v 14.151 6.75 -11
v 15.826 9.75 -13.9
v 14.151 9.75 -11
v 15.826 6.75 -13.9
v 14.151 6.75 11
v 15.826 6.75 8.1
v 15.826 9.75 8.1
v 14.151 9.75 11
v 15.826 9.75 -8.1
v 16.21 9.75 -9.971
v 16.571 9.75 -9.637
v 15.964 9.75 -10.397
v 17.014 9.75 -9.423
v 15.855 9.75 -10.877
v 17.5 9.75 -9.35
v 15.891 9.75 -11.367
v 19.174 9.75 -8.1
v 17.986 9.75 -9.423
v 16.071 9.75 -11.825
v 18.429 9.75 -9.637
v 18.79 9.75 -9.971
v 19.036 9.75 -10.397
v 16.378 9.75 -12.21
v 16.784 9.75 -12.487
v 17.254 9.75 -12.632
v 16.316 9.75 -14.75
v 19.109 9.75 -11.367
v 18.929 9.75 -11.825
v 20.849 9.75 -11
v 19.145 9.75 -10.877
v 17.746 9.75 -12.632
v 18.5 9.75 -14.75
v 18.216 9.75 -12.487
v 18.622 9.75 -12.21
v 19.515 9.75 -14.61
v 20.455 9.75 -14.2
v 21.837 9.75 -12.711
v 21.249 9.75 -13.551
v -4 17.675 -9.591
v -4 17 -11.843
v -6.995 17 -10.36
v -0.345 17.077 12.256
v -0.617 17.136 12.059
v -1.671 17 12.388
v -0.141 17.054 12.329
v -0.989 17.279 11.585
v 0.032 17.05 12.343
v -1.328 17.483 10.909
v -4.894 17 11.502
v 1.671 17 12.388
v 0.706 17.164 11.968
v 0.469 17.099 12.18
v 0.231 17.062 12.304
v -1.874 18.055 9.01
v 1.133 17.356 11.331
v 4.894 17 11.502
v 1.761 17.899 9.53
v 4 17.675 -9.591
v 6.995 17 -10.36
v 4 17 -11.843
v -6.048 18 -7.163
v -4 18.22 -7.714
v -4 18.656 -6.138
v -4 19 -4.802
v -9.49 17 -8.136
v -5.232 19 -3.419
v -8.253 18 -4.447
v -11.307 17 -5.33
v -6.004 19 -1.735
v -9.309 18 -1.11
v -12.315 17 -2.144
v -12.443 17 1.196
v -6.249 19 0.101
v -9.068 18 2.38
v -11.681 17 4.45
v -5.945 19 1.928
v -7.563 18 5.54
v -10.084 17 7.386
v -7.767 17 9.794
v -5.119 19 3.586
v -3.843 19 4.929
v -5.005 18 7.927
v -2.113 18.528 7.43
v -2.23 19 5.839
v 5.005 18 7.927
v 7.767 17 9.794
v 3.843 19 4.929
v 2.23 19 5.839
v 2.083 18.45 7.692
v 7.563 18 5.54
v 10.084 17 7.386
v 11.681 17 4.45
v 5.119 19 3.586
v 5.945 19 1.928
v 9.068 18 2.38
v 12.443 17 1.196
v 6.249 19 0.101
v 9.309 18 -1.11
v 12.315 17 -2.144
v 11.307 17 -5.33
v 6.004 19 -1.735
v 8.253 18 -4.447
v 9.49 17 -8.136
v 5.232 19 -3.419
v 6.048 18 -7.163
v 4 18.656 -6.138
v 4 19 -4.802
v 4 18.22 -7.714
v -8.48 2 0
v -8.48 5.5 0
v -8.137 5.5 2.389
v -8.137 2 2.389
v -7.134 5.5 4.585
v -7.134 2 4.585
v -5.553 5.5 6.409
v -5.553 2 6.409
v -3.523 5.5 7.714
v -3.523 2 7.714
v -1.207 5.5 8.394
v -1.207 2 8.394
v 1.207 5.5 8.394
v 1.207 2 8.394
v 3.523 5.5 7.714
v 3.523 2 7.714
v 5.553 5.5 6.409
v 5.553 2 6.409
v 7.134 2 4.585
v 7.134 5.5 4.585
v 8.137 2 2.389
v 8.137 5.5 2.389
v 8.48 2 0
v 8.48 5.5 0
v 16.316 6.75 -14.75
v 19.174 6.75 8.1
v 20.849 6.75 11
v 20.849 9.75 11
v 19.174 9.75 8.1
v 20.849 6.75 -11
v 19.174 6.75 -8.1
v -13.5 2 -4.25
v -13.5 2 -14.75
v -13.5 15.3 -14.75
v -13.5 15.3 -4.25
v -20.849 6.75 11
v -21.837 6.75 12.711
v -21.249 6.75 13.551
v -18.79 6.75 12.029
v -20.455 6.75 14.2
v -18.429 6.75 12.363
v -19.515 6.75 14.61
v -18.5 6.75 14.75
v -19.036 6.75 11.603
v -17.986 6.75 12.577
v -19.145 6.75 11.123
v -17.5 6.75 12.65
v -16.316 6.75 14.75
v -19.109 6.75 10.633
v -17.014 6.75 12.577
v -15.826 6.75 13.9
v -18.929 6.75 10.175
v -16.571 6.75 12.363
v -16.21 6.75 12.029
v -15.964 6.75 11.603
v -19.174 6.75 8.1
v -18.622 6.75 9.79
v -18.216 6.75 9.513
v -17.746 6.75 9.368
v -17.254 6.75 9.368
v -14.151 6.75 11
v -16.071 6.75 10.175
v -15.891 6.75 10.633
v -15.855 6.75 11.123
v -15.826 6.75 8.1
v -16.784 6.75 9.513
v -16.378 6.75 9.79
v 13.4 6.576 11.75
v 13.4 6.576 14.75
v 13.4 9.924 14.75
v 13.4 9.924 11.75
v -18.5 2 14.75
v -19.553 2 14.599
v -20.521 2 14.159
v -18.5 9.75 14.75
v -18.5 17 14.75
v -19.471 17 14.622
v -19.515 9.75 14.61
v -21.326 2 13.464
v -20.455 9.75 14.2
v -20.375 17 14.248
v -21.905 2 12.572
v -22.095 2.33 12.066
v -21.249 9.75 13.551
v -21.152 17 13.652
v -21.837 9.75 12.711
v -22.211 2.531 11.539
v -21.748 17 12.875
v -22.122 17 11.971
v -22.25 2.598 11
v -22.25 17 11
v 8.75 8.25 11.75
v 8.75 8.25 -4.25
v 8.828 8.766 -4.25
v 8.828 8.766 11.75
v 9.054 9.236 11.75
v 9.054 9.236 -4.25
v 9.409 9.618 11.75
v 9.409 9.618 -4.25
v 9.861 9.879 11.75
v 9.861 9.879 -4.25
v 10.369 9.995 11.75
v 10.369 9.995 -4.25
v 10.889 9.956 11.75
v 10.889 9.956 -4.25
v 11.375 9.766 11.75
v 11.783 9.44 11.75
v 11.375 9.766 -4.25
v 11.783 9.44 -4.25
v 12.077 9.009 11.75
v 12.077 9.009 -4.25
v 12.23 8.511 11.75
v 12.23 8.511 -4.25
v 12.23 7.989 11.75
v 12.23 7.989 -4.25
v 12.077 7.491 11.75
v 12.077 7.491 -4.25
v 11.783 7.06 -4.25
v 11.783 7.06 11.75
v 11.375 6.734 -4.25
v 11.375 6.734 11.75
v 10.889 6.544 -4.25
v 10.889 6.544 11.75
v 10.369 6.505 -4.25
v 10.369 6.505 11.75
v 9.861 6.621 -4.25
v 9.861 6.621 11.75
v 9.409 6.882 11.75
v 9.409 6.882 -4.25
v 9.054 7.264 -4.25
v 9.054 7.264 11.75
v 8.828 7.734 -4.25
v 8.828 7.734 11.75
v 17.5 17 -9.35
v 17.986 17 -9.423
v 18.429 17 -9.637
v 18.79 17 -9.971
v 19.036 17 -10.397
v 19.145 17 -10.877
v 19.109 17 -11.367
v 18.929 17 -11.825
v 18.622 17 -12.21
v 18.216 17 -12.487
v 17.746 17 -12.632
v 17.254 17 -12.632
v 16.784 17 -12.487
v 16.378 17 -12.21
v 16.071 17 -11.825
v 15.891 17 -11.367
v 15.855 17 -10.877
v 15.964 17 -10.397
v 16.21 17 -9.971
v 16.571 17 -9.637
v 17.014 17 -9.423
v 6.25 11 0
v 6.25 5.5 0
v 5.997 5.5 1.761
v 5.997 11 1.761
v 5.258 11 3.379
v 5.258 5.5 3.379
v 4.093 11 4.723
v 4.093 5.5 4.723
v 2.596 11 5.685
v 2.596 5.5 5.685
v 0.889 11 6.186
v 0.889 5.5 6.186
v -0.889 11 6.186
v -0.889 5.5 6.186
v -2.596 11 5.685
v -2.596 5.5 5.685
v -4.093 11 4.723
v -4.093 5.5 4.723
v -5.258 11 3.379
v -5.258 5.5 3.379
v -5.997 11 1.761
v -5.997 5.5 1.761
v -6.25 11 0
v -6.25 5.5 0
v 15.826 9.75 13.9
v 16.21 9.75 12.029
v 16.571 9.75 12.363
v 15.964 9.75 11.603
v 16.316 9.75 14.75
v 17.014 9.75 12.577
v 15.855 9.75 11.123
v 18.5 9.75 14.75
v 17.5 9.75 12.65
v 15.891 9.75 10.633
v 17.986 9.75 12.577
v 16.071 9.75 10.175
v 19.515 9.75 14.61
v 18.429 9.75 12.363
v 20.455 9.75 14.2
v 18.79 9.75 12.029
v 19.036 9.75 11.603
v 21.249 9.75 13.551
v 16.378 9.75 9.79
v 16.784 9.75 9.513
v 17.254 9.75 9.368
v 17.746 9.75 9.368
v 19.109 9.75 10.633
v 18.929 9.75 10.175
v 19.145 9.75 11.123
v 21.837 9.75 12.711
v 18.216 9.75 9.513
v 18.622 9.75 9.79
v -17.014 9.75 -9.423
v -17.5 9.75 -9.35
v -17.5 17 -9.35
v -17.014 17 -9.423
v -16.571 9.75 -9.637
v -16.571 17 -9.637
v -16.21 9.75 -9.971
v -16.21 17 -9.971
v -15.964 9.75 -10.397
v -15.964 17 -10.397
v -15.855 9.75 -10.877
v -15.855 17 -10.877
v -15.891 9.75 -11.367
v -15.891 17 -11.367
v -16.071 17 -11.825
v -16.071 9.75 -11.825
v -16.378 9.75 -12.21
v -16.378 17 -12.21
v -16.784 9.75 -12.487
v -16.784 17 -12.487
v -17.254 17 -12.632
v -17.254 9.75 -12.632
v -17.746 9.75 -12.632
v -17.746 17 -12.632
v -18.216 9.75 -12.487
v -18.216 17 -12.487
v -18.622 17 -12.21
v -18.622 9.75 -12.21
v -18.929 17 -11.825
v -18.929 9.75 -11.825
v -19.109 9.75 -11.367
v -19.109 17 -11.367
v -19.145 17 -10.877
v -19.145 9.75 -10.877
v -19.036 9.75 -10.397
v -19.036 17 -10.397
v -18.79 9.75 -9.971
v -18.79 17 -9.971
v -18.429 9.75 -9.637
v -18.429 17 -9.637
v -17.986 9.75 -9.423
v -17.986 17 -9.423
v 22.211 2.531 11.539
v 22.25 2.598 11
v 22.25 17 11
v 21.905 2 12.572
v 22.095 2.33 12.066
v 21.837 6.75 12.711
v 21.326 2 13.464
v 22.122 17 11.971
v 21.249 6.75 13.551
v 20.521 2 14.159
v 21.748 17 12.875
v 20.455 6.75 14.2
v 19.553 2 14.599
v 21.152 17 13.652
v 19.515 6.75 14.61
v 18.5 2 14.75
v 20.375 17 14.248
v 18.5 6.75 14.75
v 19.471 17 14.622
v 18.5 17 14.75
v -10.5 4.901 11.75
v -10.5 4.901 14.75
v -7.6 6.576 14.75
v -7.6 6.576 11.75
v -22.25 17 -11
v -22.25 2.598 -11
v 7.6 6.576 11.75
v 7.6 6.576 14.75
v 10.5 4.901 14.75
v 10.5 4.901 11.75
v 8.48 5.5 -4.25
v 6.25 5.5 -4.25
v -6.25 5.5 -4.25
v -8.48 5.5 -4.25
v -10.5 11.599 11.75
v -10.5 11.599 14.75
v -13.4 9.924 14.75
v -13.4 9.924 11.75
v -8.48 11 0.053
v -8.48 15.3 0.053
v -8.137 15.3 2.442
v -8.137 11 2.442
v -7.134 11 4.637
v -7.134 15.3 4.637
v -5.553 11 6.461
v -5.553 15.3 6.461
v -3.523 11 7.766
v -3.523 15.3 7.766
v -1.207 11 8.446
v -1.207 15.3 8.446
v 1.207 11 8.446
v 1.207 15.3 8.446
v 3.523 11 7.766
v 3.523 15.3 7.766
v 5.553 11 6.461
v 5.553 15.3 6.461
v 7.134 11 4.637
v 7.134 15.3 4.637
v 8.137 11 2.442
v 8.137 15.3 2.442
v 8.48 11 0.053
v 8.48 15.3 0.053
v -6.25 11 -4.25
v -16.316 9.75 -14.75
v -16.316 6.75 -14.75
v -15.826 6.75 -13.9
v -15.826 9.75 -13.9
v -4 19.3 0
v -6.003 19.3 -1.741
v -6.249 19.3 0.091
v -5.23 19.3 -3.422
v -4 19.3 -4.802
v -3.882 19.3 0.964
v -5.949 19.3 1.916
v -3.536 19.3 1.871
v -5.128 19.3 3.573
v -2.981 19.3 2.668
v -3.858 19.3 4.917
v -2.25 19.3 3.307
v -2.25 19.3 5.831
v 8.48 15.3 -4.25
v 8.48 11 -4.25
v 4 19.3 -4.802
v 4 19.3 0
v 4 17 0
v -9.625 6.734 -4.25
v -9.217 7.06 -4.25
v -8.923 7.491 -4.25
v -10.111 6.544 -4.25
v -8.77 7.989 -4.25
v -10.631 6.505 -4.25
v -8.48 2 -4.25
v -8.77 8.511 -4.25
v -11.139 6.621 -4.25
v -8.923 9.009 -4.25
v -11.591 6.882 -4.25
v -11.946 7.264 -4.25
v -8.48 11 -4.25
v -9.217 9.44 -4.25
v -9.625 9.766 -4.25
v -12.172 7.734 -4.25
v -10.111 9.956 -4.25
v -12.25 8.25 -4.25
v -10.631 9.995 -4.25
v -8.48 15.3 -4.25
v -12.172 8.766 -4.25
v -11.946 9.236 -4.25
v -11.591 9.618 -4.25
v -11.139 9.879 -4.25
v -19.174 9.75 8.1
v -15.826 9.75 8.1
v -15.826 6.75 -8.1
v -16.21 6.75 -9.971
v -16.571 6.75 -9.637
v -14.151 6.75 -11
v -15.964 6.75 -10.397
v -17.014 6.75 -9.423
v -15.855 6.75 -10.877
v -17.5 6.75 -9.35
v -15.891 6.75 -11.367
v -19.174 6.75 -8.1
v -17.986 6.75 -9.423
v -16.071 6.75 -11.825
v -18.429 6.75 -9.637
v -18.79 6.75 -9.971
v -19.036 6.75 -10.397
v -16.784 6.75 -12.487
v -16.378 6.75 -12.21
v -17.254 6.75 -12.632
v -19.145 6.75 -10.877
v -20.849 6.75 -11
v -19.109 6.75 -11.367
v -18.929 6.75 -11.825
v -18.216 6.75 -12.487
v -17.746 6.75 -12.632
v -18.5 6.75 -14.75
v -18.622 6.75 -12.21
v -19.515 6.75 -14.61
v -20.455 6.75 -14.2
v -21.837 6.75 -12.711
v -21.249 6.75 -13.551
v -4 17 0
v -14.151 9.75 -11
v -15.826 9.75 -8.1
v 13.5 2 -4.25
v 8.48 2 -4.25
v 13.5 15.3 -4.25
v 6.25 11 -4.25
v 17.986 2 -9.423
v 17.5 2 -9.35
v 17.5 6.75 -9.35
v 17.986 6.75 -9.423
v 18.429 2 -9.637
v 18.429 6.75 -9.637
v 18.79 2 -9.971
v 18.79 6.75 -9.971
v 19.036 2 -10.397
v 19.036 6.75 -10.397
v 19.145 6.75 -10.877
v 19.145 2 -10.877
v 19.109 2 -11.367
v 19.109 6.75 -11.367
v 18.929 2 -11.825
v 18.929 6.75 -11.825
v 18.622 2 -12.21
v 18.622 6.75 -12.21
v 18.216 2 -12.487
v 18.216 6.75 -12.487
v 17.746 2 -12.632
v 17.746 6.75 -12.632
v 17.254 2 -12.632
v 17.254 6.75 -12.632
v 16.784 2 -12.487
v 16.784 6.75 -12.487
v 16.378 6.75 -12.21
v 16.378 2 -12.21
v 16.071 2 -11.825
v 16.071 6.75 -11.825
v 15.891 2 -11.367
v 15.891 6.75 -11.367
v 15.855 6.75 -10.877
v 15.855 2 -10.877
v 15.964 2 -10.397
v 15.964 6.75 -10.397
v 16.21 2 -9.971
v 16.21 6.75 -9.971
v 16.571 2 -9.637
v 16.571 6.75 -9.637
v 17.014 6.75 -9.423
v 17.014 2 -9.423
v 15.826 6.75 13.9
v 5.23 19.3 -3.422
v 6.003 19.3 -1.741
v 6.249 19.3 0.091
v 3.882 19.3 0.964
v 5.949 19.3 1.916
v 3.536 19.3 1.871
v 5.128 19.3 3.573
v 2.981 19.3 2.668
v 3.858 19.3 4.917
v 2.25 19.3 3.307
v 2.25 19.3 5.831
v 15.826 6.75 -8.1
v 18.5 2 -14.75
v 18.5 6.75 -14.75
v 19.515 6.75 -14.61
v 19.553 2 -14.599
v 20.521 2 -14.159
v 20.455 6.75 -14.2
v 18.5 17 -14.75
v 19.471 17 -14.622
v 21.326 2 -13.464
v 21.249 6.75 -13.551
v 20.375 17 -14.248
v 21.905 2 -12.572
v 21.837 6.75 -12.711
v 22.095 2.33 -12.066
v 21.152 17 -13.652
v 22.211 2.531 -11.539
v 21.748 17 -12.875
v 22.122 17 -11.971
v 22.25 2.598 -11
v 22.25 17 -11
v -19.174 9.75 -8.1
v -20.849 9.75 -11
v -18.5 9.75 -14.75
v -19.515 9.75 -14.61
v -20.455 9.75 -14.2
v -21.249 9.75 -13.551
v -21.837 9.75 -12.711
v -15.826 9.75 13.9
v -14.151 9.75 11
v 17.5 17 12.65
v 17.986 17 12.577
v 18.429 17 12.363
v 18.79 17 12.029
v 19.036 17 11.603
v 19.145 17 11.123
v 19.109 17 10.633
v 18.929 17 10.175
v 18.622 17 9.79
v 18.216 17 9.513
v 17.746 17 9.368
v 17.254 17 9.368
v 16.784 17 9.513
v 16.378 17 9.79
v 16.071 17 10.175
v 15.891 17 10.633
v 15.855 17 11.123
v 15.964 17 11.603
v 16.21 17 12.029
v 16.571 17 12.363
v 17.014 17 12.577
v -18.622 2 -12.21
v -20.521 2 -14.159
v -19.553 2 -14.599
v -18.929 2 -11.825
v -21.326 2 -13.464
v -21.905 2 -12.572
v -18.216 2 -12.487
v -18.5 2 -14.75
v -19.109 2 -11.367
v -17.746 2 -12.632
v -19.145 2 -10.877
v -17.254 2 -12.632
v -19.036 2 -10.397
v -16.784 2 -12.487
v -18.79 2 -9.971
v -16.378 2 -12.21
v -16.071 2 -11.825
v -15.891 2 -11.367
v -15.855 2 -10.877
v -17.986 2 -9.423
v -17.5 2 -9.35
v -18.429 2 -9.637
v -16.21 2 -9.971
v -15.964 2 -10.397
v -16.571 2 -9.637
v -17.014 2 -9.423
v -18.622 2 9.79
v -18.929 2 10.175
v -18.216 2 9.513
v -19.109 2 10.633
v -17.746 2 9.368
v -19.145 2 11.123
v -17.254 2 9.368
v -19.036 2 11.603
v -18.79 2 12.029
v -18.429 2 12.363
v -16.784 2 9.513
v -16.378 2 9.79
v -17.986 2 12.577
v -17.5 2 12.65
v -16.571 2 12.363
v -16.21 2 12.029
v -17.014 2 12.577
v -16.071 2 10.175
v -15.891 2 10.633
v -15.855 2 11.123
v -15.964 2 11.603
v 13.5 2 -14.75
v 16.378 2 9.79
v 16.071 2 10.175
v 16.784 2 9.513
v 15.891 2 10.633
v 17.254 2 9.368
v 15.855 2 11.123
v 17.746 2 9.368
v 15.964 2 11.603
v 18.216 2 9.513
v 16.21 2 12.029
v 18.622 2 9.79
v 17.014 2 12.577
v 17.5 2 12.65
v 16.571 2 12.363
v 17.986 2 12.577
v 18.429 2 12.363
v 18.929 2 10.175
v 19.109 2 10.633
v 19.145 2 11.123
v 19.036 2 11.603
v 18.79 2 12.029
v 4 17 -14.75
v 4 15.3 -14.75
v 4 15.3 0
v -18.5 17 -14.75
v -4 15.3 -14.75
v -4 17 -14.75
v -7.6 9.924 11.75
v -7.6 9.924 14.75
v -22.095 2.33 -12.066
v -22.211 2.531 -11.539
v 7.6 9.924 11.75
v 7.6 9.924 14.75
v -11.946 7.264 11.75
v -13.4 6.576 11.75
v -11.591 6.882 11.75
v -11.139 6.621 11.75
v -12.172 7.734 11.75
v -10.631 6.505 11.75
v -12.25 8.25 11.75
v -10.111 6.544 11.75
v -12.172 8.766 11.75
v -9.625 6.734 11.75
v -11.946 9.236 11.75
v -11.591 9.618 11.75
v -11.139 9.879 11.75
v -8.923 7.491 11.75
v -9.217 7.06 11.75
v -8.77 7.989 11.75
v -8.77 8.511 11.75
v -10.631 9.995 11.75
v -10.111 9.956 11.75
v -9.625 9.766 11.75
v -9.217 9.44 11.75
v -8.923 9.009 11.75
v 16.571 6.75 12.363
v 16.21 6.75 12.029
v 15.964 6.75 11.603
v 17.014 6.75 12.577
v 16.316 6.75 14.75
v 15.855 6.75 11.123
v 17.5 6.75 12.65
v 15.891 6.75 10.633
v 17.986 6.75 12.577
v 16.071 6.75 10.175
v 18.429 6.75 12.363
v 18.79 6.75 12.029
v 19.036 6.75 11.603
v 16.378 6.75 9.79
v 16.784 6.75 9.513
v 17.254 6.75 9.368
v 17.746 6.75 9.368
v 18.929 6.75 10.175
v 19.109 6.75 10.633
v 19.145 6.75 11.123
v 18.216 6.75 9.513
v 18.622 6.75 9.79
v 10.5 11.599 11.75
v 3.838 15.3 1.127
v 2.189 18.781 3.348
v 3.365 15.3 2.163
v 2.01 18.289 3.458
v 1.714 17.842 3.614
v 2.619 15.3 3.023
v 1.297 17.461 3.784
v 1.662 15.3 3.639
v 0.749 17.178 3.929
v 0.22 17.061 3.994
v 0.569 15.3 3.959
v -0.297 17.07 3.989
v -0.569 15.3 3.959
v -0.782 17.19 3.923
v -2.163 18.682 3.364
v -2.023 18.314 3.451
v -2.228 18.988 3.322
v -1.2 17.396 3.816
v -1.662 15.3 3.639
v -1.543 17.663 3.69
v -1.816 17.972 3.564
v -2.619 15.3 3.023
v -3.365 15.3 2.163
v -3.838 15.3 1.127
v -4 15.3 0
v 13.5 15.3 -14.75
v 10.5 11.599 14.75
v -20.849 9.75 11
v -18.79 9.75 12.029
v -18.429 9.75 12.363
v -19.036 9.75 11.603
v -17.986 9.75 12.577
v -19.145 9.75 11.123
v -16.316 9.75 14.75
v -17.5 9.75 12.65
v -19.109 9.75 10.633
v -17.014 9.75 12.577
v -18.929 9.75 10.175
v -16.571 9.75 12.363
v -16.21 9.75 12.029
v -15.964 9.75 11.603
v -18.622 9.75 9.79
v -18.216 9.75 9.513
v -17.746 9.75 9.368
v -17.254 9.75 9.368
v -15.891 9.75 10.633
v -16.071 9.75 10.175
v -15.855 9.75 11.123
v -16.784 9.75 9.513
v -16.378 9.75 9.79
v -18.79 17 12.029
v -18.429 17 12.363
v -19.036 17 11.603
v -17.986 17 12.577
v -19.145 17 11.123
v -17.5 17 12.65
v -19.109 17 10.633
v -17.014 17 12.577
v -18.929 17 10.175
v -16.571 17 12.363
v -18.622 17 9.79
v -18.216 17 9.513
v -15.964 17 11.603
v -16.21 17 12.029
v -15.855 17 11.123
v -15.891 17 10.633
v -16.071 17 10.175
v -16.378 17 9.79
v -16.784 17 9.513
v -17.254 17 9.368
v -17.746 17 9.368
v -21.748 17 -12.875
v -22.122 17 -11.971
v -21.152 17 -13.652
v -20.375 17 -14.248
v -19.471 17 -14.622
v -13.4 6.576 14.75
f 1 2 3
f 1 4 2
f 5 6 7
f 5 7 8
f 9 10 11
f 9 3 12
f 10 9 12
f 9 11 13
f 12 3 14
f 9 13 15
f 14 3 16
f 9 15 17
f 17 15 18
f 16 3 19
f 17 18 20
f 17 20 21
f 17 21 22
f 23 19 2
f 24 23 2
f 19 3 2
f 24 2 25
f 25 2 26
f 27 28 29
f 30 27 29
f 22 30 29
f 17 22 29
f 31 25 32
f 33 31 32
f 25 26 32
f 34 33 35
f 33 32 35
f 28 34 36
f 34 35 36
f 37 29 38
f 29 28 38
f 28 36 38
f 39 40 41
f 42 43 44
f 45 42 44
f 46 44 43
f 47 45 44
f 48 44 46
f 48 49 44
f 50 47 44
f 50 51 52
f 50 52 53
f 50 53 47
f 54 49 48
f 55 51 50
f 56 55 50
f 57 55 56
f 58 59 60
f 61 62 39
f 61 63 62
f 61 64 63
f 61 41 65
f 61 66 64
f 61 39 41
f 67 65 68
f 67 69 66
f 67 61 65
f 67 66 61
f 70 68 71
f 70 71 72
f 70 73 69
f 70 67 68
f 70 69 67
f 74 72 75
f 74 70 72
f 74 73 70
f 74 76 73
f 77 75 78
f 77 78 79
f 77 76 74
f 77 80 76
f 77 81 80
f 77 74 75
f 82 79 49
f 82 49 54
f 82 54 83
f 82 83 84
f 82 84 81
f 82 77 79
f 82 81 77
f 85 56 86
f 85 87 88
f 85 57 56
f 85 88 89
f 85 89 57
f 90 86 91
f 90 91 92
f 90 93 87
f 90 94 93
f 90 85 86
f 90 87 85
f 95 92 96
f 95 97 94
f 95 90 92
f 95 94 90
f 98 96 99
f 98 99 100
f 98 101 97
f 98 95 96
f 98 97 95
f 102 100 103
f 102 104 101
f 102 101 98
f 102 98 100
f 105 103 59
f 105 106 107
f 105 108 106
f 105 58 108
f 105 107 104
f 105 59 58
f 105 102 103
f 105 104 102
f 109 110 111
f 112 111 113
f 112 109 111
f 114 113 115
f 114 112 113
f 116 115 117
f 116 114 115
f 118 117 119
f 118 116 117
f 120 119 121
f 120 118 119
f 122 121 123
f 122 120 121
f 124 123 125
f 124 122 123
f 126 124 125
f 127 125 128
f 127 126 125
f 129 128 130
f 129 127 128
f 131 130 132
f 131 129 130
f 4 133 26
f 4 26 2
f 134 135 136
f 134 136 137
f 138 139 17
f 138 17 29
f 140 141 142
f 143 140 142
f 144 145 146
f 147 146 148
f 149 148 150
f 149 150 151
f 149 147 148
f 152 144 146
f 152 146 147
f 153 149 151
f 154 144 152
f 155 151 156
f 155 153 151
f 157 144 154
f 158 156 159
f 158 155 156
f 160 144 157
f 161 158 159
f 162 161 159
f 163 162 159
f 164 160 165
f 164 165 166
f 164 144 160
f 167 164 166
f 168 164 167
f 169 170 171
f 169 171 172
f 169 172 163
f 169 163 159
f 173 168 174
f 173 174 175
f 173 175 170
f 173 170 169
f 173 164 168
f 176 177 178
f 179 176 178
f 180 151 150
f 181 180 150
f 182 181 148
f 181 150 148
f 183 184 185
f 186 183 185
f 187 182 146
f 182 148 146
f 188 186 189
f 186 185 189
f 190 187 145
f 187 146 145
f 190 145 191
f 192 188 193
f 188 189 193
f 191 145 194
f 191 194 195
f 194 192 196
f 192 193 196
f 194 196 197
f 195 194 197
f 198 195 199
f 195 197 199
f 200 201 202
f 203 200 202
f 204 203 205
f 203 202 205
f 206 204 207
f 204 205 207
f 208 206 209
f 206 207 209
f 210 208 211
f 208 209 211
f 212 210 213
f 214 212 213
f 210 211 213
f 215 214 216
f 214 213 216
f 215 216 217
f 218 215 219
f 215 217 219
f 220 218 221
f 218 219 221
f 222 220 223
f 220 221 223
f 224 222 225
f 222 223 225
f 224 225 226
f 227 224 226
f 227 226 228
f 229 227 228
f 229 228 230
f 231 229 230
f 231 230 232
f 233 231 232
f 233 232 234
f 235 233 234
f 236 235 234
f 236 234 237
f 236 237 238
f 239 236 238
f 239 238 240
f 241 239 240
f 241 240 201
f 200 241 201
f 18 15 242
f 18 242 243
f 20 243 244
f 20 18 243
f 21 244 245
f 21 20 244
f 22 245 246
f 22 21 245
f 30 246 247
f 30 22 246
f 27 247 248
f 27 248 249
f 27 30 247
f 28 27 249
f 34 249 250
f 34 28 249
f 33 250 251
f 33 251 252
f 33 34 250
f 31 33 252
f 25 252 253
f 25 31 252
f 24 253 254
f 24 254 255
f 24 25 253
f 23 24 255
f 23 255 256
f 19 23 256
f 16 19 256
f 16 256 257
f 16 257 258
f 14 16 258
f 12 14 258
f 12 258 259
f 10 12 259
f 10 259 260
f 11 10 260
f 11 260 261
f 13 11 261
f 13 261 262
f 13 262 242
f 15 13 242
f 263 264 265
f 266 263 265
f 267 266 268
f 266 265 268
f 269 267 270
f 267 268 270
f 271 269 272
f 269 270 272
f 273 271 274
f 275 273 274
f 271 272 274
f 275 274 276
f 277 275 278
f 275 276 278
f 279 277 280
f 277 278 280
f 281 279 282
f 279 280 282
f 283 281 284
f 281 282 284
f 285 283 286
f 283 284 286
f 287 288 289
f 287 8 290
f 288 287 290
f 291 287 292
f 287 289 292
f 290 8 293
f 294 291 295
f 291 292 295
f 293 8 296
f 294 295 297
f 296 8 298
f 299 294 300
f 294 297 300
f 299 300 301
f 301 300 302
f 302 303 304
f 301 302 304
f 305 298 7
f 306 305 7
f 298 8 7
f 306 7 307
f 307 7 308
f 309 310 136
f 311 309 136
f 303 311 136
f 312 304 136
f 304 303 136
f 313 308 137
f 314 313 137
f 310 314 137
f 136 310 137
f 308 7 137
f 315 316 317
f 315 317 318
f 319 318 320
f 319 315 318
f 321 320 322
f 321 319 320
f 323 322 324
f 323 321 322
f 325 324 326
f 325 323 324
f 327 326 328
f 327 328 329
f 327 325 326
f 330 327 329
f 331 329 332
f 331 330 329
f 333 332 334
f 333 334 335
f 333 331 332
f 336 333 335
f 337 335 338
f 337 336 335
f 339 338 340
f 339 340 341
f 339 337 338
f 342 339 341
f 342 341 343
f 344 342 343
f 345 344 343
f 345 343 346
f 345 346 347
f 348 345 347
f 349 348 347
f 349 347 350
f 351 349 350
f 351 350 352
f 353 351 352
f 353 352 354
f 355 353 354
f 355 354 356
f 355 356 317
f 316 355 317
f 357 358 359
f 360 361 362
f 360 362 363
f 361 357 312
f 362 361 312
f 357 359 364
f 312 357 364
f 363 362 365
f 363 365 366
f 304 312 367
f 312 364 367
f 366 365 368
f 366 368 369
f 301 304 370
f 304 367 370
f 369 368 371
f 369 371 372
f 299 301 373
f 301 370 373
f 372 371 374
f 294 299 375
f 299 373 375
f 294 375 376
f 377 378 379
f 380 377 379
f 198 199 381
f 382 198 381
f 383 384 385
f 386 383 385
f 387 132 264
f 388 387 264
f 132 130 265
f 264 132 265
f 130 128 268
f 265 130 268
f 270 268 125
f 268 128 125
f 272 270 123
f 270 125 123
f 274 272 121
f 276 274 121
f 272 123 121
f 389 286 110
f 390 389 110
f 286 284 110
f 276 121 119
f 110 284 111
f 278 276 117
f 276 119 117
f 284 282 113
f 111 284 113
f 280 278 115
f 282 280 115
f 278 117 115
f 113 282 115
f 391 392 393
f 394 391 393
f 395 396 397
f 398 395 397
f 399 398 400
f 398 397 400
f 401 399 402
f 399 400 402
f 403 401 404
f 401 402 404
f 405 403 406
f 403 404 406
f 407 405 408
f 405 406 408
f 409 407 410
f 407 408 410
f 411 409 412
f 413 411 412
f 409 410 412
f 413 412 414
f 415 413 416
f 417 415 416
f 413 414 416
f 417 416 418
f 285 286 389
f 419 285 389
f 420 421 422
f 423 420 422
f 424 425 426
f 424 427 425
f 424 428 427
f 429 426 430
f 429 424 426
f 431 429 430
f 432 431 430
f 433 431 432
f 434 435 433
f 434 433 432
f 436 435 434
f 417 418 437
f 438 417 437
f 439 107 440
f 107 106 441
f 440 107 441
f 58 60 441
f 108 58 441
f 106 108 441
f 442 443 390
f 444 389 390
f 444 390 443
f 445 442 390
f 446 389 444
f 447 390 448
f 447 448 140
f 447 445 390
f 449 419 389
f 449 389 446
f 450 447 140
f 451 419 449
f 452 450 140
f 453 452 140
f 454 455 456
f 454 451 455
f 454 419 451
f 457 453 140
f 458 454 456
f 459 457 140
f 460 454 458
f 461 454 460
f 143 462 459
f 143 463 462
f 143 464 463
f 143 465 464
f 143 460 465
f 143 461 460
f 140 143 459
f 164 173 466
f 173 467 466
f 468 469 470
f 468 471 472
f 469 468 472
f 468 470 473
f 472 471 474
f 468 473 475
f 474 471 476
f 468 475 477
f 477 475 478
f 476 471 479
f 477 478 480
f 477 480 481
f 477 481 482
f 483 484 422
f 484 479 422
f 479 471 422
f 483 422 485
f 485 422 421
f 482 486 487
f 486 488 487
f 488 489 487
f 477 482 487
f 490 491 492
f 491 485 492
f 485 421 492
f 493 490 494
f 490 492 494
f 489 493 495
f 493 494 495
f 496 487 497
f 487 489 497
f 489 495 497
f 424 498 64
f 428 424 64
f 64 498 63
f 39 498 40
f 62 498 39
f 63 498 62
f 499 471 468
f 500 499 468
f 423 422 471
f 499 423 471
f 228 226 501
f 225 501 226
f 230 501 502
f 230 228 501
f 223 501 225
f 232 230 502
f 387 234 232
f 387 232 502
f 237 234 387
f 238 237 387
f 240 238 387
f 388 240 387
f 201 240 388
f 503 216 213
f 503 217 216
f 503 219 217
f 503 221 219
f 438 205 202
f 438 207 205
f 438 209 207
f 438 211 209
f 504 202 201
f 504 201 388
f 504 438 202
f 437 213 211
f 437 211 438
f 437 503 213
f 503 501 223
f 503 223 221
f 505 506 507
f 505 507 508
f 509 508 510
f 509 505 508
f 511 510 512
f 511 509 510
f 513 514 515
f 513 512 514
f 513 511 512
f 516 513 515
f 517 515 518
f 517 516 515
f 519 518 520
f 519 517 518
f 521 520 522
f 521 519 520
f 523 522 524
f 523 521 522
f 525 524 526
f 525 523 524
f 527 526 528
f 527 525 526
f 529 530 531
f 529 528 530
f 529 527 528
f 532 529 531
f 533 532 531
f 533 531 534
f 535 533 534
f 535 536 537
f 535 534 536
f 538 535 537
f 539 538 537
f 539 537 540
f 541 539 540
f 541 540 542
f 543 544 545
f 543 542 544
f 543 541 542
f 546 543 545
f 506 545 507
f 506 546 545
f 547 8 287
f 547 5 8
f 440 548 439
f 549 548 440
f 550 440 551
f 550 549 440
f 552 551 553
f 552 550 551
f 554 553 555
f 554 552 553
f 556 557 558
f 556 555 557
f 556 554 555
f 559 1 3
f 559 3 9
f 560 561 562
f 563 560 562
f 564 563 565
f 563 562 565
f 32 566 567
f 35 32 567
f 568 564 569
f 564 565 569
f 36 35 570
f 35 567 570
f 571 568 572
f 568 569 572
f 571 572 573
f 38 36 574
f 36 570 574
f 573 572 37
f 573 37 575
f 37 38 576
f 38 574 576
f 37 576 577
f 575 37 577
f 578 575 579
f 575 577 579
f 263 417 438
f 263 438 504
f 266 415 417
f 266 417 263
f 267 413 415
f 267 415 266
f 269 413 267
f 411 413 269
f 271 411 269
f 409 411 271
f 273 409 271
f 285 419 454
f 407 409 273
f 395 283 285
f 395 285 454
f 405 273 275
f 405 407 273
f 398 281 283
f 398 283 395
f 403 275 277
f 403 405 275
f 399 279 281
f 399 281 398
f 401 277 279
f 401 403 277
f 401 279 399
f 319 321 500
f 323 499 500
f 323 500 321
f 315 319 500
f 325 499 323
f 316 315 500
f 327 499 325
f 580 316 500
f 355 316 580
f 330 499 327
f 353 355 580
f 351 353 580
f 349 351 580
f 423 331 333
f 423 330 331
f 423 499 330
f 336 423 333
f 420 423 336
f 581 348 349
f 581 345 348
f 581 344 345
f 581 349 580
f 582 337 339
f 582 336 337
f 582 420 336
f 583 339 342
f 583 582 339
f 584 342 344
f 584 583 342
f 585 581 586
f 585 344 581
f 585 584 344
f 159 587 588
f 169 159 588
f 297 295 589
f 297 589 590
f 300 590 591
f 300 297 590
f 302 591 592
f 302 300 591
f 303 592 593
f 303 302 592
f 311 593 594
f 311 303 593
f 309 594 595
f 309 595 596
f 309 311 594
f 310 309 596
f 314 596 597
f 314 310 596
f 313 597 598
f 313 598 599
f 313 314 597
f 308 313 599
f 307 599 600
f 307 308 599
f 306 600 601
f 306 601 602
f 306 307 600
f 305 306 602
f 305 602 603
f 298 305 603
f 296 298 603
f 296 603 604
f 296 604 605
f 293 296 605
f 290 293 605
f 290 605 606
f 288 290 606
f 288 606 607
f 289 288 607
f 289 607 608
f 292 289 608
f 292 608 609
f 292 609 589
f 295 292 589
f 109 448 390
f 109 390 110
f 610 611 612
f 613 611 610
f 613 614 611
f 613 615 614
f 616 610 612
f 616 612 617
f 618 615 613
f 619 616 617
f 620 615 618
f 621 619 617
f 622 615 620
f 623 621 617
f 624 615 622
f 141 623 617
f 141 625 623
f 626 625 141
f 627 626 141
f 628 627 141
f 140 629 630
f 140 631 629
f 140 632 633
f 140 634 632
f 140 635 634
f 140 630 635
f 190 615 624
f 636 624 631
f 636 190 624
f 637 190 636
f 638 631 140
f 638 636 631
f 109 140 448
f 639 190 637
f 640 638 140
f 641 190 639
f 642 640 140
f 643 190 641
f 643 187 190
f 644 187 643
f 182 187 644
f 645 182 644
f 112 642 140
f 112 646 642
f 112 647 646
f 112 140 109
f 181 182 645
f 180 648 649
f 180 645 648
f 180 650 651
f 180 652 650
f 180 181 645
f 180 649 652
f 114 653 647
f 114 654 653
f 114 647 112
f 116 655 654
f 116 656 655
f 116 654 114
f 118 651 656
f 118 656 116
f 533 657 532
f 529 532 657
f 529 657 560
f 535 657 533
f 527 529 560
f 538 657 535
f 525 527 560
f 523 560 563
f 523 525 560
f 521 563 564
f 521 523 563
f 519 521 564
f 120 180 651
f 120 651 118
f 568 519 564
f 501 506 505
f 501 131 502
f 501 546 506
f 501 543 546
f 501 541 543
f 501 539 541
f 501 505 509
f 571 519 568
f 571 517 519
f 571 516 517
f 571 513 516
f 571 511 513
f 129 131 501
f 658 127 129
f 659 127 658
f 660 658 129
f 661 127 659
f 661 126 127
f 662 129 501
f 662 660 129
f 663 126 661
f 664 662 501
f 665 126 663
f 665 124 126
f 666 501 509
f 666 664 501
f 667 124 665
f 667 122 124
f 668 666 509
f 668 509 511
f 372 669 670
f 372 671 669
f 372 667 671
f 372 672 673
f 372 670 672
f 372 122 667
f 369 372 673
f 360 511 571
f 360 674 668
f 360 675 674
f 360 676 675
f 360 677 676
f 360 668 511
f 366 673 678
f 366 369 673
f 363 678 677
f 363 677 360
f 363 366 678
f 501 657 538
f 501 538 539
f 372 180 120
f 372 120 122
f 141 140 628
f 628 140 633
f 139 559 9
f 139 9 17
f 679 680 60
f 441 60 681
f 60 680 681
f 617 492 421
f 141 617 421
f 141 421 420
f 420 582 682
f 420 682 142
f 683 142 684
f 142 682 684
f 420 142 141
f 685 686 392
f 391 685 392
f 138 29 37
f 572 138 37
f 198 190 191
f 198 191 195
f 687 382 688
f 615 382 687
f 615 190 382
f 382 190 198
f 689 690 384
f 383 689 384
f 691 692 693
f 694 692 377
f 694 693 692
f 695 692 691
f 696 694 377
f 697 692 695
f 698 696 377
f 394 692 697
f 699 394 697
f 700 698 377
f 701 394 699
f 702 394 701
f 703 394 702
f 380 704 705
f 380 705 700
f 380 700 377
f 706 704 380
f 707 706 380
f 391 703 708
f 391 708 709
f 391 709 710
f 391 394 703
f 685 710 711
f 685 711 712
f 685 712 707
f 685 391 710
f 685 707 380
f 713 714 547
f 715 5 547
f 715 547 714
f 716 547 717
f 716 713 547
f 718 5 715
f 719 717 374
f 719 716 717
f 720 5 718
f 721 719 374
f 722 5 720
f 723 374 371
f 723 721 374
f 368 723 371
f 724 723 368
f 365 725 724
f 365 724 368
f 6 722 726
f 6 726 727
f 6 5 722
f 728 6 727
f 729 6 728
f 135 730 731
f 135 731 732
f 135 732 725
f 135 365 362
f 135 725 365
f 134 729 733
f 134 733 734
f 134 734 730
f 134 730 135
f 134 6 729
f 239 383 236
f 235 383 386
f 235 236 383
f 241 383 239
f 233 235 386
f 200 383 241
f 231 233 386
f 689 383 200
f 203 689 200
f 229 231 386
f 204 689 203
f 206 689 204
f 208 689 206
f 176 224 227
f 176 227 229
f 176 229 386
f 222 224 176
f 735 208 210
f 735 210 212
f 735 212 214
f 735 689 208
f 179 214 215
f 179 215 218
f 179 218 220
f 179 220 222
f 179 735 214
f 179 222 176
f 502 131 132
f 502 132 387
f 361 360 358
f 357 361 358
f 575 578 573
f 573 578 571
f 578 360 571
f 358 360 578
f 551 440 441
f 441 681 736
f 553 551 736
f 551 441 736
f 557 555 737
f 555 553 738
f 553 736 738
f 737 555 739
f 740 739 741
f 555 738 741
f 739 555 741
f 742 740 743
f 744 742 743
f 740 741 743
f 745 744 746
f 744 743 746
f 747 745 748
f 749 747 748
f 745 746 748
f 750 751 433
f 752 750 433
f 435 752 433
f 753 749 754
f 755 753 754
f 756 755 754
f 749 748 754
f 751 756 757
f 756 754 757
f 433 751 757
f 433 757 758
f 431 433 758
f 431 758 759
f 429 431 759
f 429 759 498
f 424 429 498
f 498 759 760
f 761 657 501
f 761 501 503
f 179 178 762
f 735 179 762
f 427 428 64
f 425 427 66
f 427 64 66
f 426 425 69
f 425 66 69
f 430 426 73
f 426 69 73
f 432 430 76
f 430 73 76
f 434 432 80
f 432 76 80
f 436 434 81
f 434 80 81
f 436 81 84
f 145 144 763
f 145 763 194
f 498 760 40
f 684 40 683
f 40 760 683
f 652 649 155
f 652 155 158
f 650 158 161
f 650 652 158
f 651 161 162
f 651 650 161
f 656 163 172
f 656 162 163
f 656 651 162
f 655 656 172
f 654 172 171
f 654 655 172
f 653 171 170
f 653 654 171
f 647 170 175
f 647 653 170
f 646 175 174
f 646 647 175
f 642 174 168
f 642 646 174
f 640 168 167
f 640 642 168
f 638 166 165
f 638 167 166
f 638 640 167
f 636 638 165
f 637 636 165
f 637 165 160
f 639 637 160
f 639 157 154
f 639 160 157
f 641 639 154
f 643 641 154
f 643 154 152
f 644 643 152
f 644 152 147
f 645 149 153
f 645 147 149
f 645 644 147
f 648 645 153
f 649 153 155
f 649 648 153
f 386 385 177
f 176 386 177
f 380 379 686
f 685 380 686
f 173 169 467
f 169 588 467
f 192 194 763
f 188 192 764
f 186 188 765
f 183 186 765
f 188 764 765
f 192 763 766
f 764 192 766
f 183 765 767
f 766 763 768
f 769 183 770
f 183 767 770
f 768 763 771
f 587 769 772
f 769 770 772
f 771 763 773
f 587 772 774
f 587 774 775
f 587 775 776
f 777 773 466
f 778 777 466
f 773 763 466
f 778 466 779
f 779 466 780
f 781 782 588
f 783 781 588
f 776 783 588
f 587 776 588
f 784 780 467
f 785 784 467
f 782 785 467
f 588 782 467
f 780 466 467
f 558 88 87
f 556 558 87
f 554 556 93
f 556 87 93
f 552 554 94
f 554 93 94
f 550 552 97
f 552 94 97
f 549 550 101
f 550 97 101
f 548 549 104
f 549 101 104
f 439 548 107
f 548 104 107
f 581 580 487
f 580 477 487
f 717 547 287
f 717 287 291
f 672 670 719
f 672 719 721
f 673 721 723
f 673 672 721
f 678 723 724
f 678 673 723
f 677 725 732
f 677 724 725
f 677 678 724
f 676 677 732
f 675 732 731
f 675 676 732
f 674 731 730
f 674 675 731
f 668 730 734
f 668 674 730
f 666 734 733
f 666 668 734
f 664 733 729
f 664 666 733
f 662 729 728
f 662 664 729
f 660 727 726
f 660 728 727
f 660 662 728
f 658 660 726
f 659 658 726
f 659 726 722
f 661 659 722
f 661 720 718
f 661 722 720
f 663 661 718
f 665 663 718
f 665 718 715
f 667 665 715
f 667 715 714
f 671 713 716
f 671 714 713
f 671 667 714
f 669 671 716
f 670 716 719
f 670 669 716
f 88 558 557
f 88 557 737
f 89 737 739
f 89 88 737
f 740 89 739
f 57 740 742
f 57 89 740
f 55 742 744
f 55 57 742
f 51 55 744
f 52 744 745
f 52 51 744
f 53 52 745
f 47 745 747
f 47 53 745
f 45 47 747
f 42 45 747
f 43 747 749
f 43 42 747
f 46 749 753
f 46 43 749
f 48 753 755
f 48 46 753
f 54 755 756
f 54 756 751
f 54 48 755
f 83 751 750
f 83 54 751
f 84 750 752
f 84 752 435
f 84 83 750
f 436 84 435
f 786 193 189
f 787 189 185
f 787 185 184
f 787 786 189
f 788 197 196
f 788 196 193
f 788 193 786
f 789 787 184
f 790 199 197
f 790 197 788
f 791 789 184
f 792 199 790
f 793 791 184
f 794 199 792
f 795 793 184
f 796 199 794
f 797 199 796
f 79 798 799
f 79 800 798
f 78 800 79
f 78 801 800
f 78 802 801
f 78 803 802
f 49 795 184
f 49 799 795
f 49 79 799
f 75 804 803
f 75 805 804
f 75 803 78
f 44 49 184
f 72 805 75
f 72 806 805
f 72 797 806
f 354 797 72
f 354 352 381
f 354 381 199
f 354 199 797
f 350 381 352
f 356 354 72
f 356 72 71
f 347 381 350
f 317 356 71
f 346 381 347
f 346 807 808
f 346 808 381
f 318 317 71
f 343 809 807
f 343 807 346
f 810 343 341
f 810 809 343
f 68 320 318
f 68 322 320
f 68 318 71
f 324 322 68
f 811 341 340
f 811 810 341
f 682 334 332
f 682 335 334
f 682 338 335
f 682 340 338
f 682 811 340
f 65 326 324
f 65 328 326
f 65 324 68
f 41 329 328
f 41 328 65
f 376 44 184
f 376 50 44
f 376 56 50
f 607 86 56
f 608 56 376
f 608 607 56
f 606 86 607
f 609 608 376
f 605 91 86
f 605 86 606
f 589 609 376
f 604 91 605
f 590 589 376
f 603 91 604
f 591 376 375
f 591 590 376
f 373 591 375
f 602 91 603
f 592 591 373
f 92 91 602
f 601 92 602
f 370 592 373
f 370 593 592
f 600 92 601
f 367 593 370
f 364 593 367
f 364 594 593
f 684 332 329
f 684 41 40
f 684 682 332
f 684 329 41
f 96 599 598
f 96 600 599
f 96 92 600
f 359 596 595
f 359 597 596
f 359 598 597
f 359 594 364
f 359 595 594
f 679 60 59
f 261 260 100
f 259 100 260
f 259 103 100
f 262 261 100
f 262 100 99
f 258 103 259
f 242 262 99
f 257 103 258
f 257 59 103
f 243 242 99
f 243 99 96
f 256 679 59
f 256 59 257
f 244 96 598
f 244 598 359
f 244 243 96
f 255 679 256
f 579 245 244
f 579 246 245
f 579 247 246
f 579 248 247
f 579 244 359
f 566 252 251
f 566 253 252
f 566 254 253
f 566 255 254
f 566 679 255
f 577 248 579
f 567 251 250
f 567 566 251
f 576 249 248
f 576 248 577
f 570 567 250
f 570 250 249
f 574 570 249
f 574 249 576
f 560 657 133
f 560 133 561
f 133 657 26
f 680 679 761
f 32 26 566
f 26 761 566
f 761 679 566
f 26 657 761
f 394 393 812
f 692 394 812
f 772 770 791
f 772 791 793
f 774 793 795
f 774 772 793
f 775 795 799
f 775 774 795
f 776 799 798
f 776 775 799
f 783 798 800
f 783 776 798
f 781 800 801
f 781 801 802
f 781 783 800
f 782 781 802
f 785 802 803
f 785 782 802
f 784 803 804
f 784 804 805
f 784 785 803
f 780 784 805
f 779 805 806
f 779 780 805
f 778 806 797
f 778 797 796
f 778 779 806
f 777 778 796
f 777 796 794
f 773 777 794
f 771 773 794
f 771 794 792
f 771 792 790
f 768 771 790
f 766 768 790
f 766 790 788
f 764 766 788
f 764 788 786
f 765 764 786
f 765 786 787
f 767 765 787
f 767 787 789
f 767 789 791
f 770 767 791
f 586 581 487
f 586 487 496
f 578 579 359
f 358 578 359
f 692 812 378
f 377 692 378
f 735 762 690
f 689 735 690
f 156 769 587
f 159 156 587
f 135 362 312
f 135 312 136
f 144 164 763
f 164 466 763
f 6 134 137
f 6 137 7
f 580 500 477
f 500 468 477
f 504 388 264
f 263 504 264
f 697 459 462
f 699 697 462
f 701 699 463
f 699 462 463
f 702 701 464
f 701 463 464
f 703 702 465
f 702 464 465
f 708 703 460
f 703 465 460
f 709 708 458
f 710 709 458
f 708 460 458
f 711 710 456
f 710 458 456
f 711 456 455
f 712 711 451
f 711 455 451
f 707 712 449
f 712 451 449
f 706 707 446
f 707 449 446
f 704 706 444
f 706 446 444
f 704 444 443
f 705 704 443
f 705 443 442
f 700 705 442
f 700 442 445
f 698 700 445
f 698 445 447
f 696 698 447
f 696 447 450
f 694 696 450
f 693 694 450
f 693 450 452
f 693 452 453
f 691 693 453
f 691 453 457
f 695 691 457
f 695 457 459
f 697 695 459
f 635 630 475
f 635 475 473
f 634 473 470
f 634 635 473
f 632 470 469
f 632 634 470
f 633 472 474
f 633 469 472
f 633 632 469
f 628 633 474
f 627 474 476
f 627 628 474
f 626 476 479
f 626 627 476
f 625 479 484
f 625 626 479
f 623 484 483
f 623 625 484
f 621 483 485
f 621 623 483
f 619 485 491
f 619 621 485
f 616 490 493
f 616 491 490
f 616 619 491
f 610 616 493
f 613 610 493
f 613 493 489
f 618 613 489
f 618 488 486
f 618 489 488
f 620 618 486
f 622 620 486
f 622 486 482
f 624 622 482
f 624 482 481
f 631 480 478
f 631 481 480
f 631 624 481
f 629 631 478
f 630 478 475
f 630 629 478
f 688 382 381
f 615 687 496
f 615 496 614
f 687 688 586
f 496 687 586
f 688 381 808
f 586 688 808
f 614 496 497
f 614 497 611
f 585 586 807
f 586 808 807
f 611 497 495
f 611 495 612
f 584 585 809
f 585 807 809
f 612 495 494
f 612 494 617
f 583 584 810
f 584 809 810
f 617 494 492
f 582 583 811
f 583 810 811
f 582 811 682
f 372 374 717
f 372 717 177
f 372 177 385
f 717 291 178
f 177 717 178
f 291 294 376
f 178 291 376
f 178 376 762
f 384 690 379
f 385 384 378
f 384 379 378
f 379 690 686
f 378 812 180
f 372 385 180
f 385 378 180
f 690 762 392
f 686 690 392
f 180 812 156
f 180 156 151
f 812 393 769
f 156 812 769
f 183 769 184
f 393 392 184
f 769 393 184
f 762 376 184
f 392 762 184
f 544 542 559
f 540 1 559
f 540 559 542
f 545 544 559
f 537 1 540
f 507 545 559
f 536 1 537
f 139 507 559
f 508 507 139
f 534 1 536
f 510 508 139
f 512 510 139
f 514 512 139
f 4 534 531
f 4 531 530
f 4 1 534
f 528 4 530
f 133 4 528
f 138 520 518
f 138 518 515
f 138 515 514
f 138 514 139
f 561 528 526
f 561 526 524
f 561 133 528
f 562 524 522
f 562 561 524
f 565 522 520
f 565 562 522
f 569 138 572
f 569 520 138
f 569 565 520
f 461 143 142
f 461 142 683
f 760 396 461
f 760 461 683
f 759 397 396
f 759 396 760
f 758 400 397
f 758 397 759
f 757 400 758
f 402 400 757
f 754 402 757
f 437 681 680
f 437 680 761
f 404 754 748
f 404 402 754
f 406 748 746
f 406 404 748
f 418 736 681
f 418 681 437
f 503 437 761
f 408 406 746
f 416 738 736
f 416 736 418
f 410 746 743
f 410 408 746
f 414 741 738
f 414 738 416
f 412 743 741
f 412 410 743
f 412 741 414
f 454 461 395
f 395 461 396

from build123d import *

# Parameters (mm, degrees)
ESBO_O1_R                   = 1.65
RESSALTO_EXTRUS_O1_DEPTH    = 17
CORTE_EXTRUS_O2_DEPTH       = 32.941352507
CORTE_EXTRUS_O3_DEPTH       = 5.5
CORTE_EXTRUS_O4_DEPTH       = 15.3
CORTE_EXTRUS_O5_DEPTH       = 4.3
ESBO_O6_R                   = 12.5
ESBO_O7_R                   = 6.25
ESBO_O8_R                   = 6.25
RESSALTO_EXTRUS_O2_DEPTH    = 0.3
CORTE_EXTRUS_O6_DEPTH       = 32.941352507
CORTE_EXTRUS_O7_DEPTH       = 43.175111144
CORTE_EXTRUS_O7_DEPTH_BACK  = 43.175111144
ESBO_O10_R                  = 2.25
CORTE_EXTRUS_O14_DEPTH      = 34.222582739
CORTE_EXTRUS_O14_DEPTH_BACK = 34.222582739
CORTE_EXTRUS_O17_DEPTH      = 42.686958439
CORTE_EXTRUS_O17_DEPTH_BACK = 42.686958439
CORTE_EXTRUS_O18_DEPTH      = 1.5
ESBO_O22_W                  = 73.531346764
ESBO_O22_H                  = 29.602386944
CORTE_EXTRUS_O19_DEPTH      = 2
ESBO_O28_W                  = 27
ESBO_O28_H                  = 13.3
CORTE_EXTRUS_O22_DEPTH      = 10.5
ESBO_O27_R                  = 1.75
CORTE_EXTRUS_O23_DEPTH      = 42.686958439
CORTE_EXTRUS_O24_DEPTH      = 3


with BuildPart() as part:
    # Esboço1 → Ressalto-extrusão1 (new body)
    with BuildSketch(Plane(origin=(0, 0, 0), x_dir=(1, 0, 0), z_dir=(0, 1, 0))):
        with BuildLine():
            Line((-18.5, -15), (18.5, -15))
            ThreePointArc((18.5, -15), (21.328427125, -13.828427125), (22.5, -11))
            Line((22.5, -11), (22.5, 11))
            ThreePointArc((22.5, 11), (21.328427125, 13.828427125), (18.5, 15))
            Line((18.5, 15), (-18.5, 15))
            ThreePointArc((-18.5, 15), (-21.328427125, 13.828427125), (-22.5, 11))
            Line((-22.5, 11), (-22.5, -11))
            ThreePointArc((-22.5, -11), (-21.328427125, -13.828427125), (-18.5, -15))
        make_face()
        with Locations(Location((-17.5, -11, 0), (0, 0, 270))):
            Circle(ESBO_O1_R, mode=Mode.SUBTRACT)
        with Locations(Location((-17.5, 11, 0), (0, 0, 270))):
            Circle(ESBO_O1_R, mode=Mode.SUBTRACT)
        with Locations(Location((17.5, -11, 0), (0, 0, 270))):
            Circle(ESBO_O1_R, mode=Mode.SUBTRACT)
        with Locations(Location((17.5, 11, 0), (0, 0, 270))):
            Circle(ESBO_O1_R, mode=Mode.SUBTRACT)
    extrude(amount=RESSALTO_EXTRUS_O1_DEPTH)

    # Esboço3 → Corte-extrusão2 (cut, through all)
    with BuildSketch(Plane.XZ):
        with BuildLine():
            Line((-4, -15), (4, -15))
            Line((4, -15), (4, 0))
            ThreePointArc((4, 0), (0, 4), (-4, 0))
            Line((-4, 0), (-4, -15))
        make_face()
    extrude(amount=-CORTE_EXTRUS_O2_DEPTH, mode=Mode.SUBTRACT)

    # Esboço4 → Corte-extrusão3 (cut)
    with BuildSketch(Plane.XZ):
        with BuildLine():
            Line((-8.48, -15), (-8.48, 0))
            ThreePointArc((-8.48, 0), (0, 8.48), (8.48, 0))
            Line((8.48, 0), (8.48, -15))
            Line((8.48, -15), (-8.48, -15))
        make_face()
    extrude(amount=-CORTE_EXTRUS_O3_DEPTH, mode=Mode.SUBTRACT)

    # Esboço4<3> → Corte-extrusão4 (cut)
    with BuildSketch(Plane.XZ):
        with BuildLine():
            Line((-6.25, 0), (-6.25, -15))
            Line((-6.25, -15), (-4, -15))
            Line((-4, -15), (-4, 0))
            ThreePointArc((-4, 0), (0, 4), (4, 0))
            Line((4, 0), (4, -15))
            Line((4, -15), (6.25, -15))
            Line((6.25, -15), (6.25, 0))
            ThreePointArc((6.25, 0), (0, 6.25), (-6.25, 0))
        make_face()
    extrude(amount=-CORTE_EXTRUS_O4_DEPTH, mode=Mode.SUBTRACT)

    # Esboço5 → Corte-extrusão5 (cut)
    with BuildSketch(Plane.XZ.offset(-15.3)):
        with BuildLine():
            Line((-8.48, -15), (-8.48, 0.052643862))
            ThreePointArc((-8.48, 0.052643862), (0, 8.532643862), (8.48, 0.052643862))
            Line((8.48, 0.052643862), (8.48, -15))
            Line((8.48, -15), (-8.48, -15))
        make_face()
    extrude(amount=CORTE_EXTRUS_O5_DEPTH, mode=Mode.SUBTRACT)

    # Esboço6 → Loft1 section 0
    with BuildSketch(Plane(origin=(0, 17, 0), x_dir=(1, 0, 0), z_dir=(0, 1, 0))):
        Circle(ESBO_O6_R)
    # Esboço7 → Loft1 section 1
    with BuildSketch(Plane(origin=(0, 19, 0), x_dir=(1, 0, 0), z_dir=(0, 1, 0))):
        Circle(ESBO_O7_R)
    loft()

    # Esboço8 → Ressalto-extrusão2 (add)
    with BuildSketch(Plane(origin=(0, 19, 0), x_dir=(1, 0, 0), z_dir=(0, 1, 0))):
        with Locations(Location((0, 0, 0), (0, 0, 270))):
            Circle(ESBO_O8_R)
    extrude(amount=RESSALTO_EXTRUS_O2_DEPTH)

    # Esboço9 → Corte-extrusão6 (cut, through all)
    with BuildSketch(Plane.XZ.offset(-17)):
        with BuildLine():
            Line((-4, 0), (-3.999987243, -11.842772672))
            ThreePointArc((-3.999987243, -11.842772672), (2.212e-06, -12.500043117), (3.999990323, -11.842764489))
            Line((3.999990323, -11.842764489), (4, 0))
            ThreePointArc((4, 0), (0, 4), (-4, 0))
        make_face()
    extrude(amount=-CORTE_EXTRUS_O6_DEPTH, mode=Mode.SUBTRACT)

    # Esboço10 → Corte-extrusão7 (cut, two sides: drawn at the far end of the back side and taken through both)
    with BuildSketch(Plane(origin=(0, 0, -15), x_dir=(-1, 0, 0), z_dir=(0, 0, -1)).offset(-CORTE_EXTRUS_O7_DEPTH_BACK)):
        with Locations((0, 19.3)):
            Circle(ESBO_O10_R)
    extrude(amount=CORTE_EXTRUS_O7_DEPTH + CORTE_EXTRUS_O7_DEPTH_BACK, mode=Mode.SUBTRACT)

    # Esboço17 → Corte-extrusão14 (cut, two sides: drawn at the far end of the back side and taken through both)
    with BuildSketch(Plane.XZ.offset(-CORTE_EXTRUS_O14_DEPTH_BACK)):
        with BuildLine():
            Line((-8.48, -15), (8.48, -15))
            Line((8.48, -15), (18.5, -15))
            ThreePointArc((18.5, -15), (21.328427125, -13.828427125), (22.5, -11))
            Line((22.5, -11), (22.5, 11))
            ThreePointArc((22.5, 11), (21.328427125, 13.828427125), (18.5, 15))
            Line((18.5, 15), (-18.5, 15))
            ThreePointArc((-18.5, 15), (-21.328427125, 13.828427125), (-22.5, 11))
            Line((-22.5, 11), (-22.5, -11))
            ThreePointArc((-22.5, -11), (-21.328427125, -13.828427125), (-18.5, -15))
            Line((-18.5, -15), (-8.48, -15))
        make_face()
        with BuildLine():
            Line((8.48, -14.75), (18.5, -14.75))
            ThreePointArc((18.5, -14.75), (21.151650429, -13.651650429), (22.25, -11))
            Line((22.25, -11), (22.25, 11))
            ThreePointArc((22.25, 11), (21.151650429, 13.651650429), (18.5, 14.75))
            Line((18.5, 14.75), (-18.5, 14.75))
            ThreePointArc((-18.5, 14.75), (-21.151650429, 13.651650429), (-22.25, 11))
            Line((-22.25, 11), (-22.25, -11))
            ThreePointArc((-22.25, -11), (-21.151650429, -13.651650429), (-18.5, -14.75))
            Line((-18.5, -14.75), (-8.48, -14.75))
            Line((-8.48, -14.75), (8.48, -14.75))
        make_face(mode=Mode.SUBTRACT)
    extrude(amount=CORTE_EXTRUS_O14_DEPTH + CORTE_EXTRUS_O14_DEPTH_BACK, mode=Mode.SUBTRACT)

    # Esboço20 → Corte-extrusão17 (cut, two sides: drawn at the far end of the back side and taken through both)
    with BuildSketch(Plane.XY.offset(14.75).offset(-CORTE_EXTRUS_O17_DEPTH_BACK)):
        Polygon((-20.75, 0), (-22.25, 2.598076211), (-22.25, 0), align=None)
        Polygon((20.75, 0), (22.25, 2.598076211), (22.25, 0), align=None)
    extrude(amount=CORTE_EXTRUS_O17_DEPTH + CORTE_EXTRUS_O17_DEPTH_BACK, mode=Mode.SUBTRACT)

    # Esboço21 → Corte-extrusão18 (cut, symmetric)
    with BuildSketch(Plane(origin=(0, 8.25, 0), x_dir=(1, 0, 0), z_dir=(0, 1, 0))):
        Polygon((-20.848631561, 11), (-26.366704658, 20.557582963), (-21.343757316, 23.457582963), (-15.825684219, 13.9), (-14.151368439, 11), (-15.825684219, 8.1), (-19.174315781, 8.1), align=None)
        Polygon((19.174315781, 8.1), (20.848631561, 11), (26.085179504, 20.069967093), (21.158487208, 23.136685723), (15.825684219, 13.9), (14.151368439, 11), (15.825684219, 8.1), align=None)
        Polygon((15.825684219, -8.1), (14.151368439, -11), (15.825684219, -13.9), (19.678983152, -20.574109528), (25.513300663, -19.079443885), (20.848631561, -11), (19.174315781, -8.1), align=None)
        Polygon((-19.174315781, -8.1), (-20.848631561, -11), (-25.445111293, -18.961336431), (-20.050312904, -21.217271525), (-15.825684219, -13.9), (-14.151368439, -11), (-15.825684219, -8.1), align=None)
    extrude(amount=CORTE_EXTRUS_O18_DEPTH, both=True, mode=Mode.SUBTRACT)

    # Esboço22 → Corte-extrusão19 (cut)
    with BuildSketch(Plane.XZ):
        Rectangle(ESBO_O22_W, ESBO_O22_H)
    extrude(amount=-CORTE_EXTRUS_O19_DEPTH, mode=Mode.SUBTRACT)

    # Esboço28 → Corte-extrusão22 (cut)
    with BuildSketch(Plane(origin=(0, 0, -14.75), x_dir=(-1, 0, 0), z_dir=(0, 0, -1))):
        with Locations((0, 8.65)):
            Rectangle(ESBO_O28_W, ESBO_O28_H)
    extrude(amount=-CORTE_EXTRUS_O22_DEPTH, mode=Mode.SUBTRACT)

    # Esboço27 → Corte-extrusão23 (cut, through all)
    with BuildSketch(Plane(origin=(0, 0, -14.75), x_dir=(-1, 0, 0), z_dir=(0, 0, -1))):
        with Locations((-10.5, 8.25)):
            Circle(ESBO_O27_R)
        with Locations((10.5, 8.25)):
            Circle(ESBO_O27_R)
    extrude(amount=-CORTE_EXTRUS_O23_DEPTH, mode=Mode.SUBTRACT)

    # Esboço29 → Corte-extrusão24 (cut)
    with BuildSketch(Plane.XY.offset(14.75)):
        Polygon((-7.6, 9.924315781), (-10.5, 11.598631561), (-13.4, 9.924315781), (-13.4, 6.575684219), (-10.5, 4.901368439), (-7.6, 6.575684219), align=None)
        Polygon((10.5, 11.598631561), (7.6, 9.924315781), (7.6, 6.575684219), (10.5, 4.901368439), (13.4, 6.575684219), (13.4, 9.924315781), align=None)
    extrude(amount=-CORTE_EXTRUS_O24_DEPTH, mode=Mode.SUBTRACT)


solid = part.part
